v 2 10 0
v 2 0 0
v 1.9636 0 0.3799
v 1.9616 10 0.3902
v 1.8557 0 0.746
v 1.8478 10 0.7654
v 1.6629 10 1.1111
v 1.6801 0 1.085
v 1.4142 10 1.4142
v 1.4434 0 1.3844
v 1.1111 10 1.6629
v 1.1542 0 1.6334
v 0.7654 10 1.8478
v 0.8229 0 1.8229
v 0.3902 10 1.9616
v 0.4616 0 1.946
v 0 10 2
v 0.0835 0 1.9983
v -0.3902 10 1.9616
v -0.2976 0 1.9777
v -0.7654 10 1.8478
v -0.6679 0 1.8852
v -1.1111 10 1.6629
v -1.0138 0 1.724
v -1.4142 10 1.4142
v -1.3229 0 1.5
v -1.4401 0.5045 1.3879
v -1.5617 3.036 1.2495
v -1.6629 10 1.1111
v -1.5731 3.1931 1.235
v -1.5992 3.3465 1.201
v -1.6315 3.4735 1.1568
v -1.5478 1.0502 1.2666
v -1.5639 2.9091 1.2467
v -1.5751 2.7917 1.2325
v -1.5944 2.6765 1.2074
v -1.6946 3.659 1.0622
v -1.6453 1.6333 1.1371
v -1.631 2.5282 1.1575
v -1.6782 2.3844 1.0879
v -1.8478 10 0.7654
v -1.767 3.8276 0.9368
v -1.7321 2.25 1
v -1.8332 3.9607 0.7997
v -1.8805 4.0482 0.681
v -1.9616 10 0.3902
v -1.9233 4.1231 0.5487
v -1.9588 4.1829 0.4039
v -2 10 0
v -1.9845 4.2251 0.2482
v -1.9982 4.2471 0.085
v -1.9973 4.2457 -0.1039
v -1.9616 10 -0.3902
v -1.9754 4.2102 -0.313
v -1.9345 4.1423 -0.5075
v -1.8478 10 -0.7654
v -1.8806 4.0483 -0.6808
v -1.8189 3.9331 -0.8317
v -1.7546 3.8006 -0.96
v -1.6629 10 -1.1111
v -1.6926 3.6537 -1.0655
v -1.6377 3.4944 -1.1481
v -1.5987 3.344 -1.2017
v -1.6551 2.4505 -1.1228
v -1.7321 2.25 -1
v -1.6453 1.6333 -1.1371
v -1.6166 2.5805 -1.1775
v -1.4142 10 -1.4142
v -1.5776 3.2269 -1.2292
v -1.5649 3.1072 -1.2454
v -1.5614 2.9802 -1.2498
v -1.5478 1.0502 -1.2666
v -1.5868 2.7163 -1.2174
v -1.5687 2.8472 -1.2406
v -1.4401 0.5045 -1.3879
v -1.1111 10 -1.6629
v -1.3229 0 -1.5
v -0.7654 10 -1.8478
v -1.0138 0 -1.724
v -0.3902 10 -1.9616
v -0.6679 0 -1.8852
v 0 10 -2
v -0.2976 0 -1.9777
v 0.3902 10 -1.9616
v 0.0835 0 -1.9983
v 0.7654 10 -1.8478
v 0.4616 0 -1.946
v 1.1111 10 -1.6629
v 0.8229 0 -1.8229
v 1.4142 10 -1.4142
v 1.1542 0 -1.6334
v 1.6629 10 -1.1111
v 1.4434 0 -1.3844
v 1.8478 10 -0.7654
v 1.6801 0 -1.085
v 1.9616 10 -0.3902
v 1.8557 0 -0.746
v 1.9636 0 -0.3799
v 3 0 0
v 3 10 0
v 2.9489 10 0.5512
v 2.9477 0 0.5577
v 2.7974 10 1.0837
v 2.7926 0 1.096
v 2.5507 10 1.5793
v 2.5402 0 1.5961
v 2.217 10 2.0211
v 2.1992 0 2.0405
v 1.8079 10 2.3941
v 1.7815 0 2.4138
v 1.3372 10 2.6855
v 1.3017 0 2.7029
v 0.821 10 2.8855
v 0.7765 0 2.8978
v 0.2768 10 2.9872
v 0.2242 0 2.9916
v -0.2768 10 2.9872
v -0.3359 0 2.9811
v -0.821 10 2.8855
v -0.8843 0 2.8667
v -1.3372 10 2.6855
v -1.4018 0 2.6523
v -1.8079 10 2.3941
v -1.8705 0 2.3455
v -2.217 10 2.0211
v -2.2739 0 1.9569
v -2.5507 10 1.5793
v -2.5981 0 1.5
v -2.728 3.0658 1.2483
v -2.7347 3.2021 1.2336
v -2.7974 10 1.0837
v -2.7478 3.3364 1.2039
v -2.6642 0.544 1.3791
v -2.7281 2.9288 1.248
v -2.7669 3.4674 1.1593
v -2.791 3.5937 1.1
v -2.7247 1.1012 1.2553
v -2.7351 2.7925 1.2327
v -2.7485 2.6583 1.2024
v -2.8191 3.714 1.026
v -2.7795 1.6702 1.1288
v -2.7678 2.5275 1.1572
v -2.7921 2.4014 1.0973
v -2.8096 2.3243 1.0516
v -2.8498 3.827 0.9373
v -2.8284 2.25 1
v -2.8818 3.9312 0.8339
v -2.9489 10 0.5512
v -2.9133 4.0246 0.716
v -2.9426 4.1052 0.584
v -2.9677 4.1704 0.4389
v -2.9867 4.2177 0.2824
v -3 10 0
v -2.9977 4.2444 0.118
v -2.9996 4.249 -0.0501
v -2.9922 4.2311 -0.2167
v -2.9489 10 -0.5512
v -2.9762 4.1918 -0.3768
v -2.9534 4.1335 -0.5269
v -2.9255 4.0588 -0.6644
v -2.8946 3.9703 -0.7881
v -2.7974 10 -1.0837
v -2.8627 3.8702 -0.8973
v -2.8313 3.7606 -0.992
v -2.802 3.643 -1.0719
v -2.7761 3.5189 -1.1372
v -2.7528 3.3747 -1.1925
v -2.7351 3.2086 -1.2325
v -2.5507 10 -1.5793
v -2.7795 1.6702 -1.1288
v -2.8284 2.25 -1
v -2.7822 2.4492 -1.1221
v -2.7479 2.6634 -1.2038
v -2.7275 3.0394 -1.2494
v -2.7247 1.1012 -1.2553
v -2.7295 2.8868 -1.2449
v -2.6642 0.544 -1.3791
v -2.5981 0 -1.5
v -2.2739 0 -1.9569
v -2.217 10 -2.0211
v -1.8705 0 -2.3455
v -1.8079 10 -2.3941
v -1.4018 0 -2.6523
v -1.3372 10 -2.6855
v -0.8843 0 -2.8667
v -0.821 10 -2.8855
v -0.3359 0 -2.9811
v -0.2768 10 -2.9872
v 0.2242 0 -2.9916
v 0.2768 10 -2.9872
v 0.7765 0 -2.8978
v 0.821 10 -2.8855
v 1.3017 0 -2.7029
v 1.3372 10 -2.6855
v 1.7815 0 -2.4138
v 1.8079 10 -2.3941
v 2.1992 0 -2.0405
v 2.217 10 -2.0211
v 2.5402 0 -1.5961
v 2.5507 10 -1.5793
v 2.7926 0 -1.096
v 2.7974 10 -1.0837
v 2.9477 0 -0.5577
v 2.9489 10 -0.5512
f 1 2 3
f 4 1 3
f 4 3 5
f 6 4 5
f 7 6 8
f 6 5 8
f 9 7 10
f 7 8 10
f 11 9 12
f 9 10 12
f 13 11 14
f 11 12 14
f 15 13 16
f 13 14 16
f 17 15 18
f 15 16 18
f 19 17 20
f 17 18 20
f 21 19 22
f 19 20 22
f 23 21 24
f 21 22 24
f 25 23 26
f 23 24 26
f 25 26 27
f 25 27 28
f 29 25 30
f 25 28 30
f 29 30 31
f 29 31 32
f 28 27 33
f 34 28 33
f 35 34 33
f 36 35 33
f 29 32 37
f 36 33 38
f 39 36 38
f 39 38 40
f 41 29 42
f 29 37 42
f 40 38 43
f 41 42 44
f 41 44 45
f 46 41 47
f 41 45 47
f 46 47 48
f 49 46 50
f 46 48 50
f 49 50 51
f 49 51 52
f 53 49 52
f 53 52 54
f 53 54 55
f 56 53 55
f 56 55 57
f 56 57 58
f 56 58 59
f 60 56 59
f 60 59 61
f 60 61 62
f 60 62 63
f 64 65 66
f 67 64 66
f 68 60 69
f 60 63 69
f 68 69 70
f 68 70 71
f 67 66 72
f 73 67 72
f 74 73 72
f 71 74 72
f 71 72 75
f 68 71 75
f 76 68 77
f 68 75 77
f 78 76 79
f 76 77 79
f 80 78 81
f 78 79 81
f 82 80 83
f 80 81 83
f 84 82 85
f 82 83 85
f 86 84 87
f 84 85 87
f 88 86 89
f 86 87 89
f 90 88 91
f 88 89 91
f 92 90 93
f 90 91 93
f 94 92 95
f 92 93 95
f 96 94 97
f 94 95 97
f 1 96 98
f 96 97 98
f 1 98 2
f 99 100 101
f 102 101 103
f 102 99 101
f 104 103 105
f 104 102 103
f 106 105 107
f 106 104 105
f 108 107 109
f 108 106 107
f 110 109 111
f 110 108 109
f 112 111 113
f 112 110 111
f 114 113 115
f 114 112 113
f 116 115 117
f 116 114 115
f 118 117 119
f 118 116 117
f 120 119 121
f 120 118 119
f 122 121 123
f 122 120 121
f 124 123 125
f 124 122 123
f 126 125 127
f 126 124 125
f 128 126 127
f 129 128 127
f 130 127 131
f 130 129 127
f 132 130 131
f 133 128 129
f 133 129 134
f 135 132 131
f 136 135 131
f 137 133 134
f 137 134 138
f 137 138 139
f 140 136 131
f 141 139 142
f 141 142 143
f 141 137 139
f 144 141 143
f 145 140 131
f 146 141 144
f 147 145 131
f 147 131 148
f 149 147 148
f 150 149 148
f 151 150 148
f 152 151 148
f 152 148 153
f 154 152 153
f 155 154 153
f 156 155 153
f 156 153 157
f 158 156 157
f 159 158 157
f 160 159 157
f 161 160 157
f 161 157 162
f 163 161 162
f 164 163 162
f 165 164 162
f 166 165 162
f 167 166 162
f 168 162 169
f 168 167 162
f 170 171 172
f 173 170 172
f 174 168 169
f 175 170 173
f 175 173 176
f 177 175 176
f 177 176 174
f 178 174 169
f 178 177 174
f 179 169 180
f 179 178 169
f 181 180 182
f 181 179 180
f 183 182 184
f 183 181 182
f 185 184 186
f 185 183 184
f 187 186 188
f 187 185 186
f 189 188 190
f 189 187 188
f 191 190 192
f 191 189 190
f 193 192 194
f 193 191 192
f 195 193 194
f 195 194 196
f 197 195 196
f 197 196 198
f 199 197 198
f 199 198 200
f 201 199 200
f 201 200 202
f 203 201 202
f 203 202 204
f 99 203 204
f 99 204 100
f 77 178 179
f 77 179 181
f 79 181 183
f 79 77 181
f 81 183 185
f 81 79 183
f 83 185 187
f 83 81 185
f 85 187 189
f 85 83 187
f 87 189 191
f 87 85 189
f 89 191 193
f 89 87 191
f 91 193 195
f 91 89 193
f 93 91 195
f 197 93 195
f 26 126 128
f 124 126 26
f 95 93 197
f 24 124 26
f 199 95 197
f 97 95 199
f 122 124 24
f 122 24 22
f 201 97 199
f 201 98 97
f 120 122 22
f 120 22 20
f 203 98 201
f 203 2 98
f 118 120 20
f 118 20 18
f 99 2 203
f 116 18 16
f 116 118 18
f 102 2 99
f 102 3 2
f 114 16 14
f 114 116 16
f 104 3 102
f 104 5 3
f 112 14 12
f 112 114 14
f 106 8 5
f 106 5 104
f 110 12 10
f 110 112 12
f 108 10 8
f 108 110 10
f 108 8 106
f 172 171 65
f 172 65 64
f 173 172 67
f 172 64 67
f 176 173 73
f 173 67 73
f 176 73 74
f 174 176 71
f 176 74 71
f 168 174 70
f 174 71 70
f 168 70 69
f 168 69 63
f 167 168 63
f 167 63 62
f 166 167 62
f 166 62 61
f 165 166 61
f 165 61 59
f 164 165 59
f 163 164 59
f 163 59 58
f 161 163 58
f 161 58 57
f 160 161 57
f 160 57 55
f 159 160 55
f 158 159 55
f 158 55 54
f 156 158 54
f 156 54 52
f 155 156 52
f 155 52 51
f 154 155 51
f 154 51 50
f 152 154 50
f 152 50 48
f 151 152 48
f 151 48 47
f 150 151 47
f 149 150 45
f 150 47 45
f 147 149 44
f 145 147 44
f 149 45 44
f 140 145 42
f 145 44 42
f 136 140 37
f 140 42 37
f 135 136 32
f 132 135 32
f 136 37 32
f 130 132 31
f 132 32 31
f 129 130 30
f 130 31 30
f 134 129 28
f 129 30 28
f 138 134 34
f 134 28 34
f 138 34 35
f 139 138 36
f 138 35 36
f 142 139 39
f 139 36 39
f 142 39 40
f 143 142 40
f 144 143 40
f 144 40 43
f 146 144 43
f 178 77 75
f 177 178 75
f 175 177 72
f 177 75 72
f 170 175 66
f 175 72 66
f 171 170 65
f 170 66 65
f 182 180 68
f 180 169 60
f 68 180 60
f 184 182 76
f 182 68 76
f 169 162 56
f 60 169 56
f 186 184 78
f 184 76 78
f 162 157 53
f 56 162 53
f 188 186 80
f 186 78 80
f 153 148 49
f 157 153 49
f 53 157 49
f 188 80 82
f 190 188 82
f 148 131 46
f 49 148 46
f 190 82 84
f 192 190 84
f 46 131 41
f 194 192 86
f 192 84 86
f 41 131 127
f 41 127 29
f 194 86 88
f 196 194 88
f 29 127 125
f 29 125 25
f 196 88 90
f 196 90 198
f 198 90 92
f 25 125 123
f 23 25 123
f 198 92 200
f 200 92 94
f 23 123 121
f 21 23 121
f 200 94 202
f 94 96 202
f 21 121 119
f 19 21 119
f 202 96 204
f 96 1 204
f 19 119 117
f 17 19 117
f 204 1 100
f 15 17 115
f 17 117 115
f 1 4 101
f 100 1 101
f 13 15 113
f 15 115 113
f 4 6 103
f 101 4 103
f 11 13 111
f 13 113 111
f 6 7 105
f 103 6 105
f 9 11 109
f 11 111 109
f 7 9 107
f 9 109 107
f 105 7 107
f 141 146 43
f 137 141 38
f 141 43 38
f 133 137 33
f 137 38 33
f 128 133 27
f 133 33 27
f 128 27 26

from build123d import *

# Parameters (mm, degrees)
F0_R     = 3
F1_DEPTH = 10
F3_DEPTH = 25
F4_R     = 2
F5_DEPTH = 25


with BuildPart() as f1:
    # F0 (on Front) → F1 (new body)
    with BuildSketch(Plane.XZ):
        Circle(F0_R)
    extrude(amount=-F1_DEPTH)

    # F2 (on Right) → F3 (cut)
    with BuildSketch(Plane.YZ):
        with BuildLine():
            Line((0, 1.5), (0, 0))
            Line((0, 0), (0, -1.5))
            Line((0, -1.5), (2.25, -1))
            ThreePointArc((2.25, -1), (4.25, 0), (2.25, 1))
            Line((2.25, 1), (0, 1.5))
        make_face()
    extrude(amount=-F3_DEPTH, mode=Mode.SUBTRACT)

    # F4 (on Front) → F5 (cut)
    with BuildSketch(Plane.XZ):
        Circle(F4_R)
    extrude(amount=-F5_DEPTH, mode=Mode.SUBTRACT)


solid = f1.part
